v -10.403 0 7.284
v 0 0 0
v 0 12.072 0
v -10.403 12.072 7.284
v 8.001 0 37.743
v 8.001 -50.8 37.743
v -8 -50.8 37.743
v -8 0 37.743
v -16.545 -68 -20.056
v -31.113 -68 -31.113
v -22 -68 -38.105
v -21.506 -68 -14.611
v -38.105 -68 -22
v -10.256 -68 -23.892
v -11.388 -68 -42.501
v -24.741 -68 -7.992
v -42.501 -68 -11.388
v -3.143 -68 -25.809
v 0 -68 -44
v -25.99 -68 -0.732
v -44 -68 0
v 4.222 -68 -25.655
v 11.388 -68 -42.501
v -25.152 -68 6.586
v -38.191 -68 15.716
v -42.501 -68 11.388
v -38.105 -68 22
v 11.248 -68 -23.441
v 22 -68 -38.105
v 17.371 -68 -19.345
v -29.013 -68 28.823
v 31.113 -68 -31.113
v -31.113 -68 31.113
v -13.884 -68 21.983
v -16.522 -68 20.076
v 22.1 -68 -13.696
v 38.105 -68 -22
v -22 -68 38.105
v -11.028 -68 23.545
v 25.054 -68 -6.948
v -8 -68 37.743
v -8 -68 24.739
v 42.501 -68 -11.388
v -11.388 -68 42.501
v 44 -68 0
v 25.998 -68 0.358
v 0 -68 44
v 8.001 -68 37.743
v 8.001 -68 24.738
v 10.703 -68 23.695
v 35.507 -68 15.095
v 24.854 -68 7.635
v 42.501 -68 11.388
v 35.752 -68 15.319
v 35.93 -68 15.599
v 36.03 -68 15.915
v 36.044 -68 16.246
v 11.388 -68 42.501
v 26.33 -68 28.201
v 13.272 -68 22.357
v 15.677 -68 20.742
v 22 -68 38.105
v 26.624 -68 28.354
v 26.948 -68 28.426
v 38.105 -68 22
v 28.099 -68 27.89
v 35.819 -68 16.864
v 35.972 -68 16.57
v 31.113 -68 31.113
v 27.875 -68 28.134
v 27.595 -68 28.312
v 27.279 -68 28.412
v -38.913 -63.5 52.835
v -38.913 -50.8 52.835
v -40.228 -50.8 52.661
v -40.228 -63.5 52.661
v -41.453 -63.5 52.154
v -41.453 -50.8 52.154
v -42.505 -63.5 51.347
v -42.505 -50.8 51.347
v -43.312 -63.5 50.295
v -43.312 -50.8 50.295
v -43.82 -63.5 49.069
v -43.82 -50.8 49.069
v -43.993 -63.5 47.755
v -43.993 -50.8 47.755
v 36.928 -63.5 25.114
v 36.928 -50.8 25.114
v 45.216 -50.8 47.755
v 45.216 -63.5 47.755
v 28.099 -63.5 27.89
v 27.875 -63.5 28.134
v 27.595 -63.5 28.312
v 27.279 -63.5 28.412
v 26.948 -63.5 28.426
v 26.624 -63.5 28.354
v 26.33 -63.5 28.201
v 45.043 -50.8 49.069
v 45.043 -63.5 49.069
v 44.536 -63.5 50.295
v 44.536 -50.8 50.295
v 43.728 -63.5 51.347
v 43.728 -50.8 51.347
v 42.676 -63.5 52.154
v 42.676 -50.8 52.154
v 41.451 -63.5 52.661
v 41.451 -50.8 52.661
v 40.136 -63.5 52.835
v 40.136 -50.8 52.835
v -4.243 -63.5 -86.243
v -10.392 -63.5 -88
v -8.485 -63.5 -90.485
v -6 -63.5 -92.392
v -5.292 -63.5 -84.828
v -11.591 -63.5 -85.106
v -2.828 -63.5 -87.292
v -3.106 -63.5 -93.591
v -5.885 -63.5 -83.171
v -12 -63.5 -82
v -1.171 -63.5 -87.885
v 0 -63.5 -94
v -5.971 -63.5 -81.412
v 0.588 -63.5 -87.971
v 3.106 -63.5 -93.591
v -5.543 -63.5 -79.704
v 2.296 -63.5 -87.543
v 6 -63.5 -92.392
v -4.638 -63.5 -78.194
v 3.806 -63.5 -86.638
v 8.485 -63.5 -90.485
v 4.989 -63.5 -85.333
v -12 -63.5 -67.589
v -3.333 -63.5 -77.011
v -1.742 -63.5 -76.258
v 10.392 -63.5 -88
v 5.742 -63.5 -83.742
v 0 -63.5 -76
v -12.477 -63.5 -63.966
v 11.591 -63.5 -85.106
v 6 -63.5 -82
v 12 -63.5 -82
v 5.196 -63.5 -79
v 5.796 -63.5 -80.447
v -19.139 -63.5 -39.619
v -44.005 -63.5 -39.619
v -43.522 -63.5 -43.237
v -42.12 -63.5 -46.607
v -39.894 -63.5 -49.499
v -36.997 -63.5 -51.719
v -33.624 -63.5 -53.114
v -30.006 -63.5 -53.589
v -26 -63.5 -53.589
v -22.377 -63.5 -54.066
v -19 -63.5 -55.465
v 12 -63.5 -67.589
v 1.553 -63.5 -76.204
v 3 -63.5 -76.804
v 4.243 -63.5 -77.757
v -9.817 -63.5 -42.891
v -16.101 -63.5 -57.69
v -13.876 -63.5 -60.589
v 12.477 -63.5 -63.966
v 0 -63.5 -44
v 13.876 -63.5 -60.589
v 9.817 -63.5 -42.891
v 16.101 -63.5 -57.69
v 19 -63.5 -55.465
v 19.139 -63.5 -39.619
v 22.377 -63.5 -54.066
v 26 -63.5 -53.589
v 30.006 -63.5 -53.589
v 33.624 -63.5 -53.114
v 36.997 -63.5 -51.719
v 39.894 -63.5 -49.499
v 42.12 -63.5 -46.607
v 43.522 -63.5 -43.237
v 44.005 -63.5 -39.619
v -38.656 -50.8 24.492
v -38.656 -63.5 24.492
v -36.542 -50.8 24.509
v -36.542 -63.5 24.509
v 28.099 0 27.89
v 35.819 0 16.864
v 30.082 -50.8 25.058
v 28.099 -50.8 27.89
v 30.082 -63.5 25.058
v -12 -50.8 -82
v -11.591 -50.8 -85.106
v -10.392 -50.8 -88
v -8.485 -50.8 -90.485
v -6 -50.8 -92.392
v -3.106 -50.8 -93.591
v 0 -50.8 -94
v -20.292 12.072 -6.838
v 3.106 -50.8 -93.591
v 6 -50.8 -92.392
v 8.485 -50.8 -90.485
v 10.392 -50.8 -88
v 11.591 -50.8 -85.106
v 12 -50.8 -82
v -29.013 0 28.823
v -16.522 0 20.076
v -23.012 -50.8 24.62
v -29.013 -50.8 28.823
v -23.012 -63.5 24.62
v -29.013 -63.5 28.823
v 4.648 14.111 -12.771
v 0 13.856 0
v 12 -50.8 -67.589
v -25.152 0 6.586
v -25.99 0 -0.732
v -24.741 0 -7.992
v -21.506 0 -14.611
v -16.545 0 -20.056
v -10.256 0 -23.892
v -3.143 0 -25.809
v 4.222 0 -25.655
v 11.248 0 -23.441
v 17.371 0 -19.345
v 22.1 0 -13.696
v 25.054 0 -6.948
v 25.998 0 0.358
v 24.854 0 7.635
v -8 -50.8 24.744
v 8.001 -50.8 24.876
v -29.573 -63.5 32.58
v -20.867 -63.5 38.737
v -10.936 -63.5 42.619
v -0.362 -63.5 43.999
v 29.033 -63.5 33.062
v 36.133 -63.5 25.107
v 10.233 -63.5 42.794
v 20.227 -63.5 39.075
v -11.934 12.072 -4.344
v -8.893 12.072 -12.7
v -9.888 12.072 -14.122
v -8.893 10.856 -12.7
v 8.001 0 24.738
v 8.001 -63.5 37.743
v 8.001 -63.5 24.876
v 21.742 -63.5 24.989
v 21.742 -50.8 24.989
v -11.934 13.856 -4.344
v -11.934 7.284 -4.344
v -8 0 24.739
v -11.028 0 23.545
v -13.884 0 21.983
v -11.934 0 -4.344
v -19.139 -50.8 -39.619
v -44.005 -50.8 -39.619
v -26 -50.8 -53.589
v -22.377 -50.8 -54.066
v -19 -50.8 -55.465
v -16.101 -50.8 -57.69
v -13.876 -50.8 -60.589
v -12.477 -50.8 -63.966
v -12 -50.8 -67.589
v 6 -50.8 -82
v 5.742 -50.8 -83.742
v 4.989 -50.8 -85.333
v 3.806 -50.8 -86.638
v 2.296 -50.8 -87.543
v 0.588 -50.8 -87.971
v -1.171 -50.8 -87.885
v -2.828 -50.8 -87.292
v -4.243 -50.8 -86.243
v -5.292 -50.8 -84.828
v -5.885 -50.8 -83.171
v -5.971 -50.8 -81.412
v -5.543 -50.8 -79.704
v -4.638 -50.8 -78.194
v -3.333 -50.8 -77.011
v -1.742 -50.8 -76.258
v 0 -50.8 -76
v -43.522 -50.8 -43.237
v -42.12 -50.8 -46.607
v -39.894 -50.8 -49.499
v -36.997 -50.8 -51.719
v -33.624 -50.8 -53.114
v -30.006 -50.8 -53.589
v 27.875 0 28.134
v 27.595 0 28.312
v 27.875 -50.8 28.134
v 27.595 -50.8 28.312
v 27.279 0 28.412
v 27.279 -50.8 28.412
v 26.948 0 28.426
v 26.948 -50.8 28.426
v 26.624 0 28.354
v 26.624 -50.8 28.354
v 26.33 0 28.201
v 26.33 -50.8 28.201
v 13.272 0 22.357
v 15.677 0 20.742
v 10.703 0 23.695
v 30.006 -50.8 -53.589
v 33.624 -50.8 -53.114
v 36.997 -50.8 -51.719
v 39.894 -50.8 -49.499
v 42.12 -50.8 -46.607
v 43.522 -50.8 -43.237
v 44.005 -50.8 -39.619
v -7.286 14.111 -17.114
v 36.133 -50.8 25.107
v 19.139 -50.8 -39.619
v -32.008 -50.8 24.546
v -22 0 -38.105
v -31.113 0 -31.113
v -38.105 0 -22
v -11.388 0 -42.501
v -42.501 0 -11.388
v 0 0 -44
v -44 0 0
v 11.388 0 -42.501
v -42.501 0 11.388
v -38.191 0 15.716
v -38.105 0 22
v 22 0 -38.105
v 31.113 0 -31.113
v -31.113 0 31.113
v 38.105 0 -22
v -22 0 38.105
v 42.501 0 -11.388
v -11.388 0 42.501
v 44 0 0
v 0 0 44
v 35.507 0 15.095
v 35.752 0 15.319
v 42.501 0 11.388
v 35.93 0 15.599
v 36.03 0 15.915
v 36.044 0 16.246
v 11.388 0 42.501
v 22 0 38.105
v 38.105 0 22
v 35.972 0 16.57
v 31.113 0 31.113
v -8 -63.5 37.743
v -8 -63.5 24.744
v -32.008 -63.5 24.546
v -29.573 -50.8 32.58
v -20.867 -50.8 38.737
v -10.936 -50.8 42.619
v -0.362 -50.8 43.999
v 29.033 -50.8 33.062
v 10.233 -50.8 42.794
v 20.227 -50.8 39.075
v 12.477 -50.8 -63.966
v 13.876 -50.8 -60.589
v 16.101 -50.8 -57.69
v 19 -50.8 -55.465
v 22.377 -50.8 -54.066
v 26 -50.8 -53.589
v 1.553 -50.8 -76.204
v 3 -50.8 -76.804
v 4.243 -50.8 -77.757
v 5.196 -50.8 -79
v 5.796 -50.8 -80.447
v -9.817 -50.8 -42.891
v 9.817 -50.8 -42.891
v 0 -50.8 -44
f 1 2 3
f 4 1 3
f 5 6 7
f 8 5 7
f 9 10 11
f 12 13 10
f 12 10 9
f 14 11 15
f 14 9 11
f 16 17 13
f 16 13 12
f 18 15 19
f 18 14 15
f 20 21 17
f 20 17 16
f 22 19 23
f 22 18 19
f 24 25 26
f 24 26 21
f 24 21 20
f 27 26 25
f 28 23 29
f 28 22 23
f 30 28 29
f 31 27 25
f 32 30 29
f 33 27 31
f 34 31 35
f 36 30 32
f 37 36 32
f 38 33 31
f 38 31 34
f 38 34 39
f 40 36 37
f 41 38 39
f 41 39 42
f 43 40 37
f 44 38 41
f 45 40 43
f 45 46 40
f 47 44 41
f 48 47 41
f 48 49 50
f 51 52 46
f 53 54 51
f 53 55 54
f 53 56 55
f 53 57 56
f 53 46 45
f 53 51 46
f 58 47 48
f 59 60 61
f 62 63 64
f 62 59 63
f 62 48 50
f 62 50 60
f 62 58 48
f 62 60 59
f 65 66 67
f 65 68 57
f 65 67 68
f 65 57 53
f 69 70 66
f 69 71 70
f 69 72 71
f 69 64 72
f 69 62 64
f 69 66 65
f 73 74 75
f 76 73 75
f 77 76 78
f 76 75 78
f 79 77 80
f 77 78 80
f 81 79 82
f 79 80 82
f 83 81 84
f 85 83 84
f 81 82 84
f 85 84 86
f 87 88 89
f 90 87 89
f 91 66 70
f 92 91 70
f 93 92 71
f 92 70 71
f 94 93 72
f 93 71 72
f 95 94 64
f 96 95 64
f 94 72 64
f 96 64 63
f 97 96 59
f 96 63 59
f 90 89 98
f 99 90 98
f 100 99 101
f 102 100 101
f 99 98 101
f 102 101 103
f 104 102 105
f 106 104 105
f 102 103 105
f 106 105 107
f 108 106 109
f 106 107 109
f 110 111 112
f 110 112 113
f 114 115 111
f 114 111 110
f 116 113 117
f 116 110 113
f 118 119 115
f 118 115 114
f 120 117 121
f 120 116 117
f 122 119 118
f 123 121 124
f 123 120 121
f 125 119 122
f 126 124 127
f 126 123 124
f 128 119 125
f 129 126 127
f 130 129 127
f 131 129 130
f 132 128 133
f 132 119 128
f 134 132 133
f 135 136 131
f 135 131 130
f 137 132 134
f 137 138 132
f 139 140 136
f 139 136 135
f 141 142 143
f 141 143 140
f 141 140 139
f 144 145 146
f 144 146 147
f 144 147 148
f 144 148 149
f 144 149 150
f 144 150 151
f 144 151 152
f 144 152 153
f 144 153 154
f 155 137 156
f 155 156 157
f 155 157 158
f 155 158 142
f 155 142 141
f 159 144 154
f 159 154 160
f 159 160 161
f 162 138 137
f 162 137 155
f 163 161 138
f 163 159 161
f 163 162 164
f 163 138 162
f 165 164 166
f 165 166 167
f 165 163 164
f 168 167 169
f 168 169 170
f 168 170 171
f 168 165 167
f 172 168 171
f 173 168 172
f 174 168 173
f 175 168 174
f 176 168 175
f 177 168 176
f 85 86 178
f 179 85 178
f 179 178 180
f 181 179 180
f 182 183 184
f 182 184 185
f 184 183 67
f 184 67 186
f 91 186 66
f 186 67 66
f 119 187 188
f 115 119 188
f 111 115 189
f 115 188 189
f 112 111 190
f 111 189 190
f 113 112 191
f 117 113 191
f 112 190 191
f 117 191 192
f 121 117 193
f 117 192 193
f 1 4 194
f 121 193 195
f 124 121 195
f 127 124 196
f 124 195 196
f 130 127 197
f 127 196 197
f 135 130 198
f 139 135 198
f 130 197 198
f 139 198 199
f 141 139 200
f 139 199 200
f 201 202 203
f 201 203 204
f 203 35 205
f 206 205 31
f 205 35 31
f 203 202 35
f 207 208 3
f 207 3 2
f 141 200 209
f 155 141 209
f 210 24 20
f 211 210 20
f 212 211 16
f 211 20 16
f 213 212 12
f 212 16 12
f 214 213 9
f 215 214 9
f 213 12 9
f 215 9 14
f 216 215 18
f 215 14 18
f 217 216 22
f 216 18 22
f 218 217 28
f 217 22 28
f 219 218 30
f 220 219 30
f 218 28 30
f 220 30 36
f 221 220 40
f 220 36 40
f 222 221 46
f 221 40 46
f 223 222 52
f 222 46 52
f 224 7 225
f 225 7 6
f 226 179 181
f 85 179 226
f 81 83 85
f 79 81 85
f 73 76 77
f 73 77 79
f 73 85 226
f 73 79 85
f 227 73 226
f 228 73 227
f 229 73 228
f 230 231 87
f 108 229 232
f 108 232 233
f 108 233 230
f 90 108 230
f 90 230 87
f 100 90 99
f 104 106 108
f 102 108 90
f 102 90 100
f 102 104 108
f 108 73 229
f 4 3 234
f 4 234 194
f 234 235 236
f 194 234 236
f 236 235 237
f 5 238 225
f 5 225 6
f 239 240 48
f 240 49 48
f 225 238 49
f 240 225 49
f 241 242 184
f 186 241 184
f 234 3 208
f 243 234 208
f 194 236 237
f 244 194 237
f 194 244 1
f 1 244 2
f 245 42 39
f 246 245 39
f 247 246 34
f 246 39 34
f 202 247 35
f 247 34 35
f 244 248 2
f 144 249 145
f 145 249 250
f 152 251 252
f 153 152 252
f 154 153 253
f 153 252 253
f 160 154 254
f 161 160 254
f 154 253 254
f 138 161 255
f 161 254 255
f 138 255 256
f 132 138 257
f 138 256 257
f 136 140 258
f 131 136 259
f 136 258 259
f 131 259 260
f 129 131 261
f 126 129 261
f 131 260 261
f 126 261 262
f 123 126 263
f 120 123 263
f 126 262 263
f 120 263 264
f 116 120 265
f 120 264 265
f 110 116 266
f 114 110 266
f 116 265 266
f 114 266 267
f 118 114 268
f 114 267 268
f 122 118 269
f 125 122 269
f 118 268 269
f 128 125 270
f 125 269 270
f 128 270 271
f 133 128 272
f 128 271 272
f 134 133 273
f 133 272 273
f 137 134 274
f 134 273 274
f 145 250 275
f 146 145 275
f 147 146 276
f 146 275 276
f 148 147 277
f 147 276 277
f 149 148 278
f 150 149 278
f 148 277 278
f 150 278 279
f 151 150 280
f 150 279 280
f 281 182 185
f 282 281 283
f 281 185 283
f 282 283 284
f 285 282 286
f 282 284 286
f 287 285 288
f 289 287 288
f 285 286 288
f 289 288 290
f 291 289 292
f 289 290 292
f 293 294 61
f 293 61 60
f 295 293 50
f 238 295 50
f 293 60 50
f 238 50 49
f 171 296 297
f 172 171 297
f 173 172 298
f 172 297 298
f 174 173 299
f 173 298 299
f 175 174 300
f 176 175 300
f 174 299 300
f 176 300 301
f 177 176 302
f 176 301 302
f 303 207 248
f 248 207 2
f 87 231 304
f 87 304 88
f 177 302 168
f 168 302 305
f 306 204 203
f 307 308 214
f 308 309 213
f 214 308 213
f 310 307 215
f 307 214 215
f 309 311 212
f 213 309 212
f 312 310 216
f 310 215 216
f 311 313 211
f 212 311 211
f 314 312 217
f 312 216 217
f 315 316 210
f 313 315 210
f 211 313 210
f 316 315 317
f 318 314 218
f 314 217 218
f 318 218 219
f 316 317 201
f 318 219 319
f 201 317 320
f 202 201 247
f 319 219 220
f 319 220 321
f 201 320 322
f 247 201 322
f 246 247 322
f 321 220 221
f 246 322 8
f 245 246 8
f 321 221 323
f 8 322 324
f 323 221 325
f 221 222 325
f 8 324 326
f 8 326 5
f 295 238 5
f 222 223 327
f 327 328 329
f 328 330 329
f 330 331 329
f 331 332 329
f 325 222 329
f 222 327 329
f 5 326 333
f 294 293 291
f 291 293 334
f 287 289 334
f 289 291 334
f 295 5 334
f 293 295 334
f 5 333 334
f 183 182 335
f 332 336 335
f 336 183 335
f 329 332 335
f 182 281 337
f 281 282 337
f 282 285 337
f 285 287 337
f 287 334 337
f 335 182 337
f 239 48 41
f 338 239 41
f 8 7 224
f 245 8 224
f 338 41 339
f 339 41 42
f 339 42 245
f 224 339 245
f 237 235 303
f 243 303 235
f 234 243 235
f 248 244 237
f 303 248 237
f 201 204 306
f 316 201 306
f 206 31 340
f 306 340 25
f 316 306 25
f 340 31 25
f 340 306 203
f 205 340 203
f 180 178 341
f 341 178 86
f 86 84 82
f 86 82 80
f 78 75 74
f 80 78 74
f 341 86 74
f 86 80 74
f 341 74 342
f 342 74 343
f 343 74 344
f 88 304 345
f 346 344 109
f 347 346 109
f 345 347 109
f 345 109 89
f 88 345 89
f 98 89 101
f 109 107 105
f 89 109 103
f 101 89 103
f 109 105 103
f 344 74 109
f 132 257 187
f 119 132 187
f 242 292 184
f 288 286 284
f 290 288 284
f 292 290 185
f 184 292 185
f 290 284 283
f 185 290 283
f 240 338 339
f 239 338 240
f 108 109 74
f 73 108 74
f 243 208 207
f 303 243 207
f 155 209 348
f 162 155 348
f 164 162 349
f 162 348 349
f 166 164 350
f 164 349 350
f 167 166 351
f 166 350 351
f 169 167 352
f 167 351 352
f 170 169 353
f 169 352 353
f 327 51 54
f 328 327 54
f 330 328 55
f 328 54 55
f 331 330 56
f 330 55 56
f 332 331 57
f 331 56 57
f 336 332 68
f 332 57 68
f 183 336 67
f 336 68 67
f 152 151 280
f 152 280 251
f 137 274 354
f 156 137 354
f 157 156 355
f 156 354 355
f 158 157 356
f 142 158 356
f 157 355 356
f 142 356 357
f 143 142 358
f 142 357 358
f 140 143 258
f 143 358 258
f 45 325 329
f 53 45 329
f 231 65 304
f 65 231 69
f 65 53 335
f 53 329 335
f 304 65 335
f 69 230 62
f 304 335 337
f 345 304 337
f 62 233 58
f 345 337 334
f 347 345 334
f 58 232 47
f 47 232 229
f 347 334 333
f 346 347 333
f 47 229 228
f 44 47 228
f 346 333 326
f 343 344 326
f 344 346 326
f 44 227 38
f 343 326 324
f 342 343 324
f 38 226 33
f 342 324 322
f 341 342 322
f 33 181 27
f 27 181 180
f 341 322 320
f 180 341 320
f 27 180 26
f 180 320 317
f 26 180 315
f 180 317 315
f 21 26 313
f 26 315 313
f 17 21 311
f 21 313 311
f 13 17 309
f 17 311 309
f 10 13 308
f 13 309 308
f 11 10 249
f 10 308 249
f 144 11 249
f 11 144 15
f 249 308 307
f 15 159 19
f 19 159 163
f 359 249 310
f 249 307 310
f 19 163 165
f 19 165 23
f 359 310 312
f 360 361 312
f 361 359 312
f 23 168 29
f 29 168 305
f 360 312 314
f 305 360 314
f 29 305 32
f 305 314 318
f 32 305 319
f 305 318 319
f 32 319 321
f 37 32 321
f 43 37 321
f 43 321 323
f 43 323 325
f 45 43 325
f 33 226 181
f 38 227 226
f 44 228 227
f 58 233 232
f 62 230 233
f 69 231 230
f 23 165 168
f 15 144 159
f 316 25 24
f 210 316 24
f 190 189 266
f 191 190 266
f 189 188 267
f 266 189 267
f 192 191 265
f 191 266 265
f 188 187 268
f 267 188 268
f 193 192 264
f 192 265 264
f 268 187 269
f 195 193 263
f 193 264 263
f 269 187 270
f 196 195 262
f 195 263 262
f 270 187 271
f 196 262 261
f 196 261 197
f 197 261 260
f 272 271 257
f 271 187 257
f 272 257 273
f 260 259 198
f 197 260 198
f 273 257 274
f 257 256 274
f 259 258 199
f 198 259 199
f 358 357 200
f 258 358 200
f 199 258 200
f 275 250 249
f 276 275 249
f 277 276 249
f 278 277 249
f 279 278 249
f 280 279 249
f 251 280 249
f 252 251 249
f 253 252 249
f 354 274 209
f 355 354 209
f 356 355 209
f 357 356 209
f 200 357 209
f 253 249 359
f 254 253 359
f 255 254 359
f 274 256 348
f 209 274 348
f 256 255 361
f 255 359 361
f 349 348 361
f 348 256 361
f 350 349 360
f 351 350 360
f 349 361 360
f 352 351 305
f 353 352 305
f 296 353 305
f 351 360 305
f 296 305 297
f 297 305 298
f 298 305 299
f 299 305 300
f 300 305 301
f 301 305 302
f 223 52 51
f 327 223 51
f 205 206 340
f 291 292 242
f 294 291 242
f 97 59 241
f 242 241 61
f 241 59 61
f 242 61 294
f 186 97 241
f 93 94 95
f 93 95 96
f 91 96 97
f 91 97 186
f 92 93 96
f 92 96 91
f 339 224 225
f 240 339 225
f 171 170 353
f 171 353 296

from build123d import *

# Parameters (mm, degrees)
F0_R      = 44
F1_DEPTH  = 68
F7_DEPTH  = 68.001
F10_DEPTH = 12.7
F13_DEPTH = 12.7
F14_DEPTH = 12.7
F17_DEPTH = 12.7


# Not quite as in the source:
# - a feature names something its author has since deleted; it is built from what else it names


with BuildPart() as f1:
    # F0 (on Front) → F1 (new body)
    with BuildSketch(Plane.XZ):
        Circle(F0_R)
    extrude(amount=F1_DEPTH)

    # F3 (on offset) → F7 (cut, through all)
    with BuildSketch(Plane.XZ.offset(68)):
        with BuildLine():
            Line((26.3302369395, 28.2014110136), (15.6770635175, 20.7419786777))
            ThreePointArc((15.6770635175, 20.7419786777), (12.0064707427, 23.0617575285), (8.001, 24.7383103505))
            ThreePointArc((8.001, 24.7383103505), (0.0005254973, 25.9999999947), (-8, 24.7386337537))
            ThreePointArc((-8, 24.7386337537), (-12.480459792, 22.8087291049), (-16.5215362846, 20.0758272257))
            Line((-16.5215362846, 20.0758272257), (-29.0134122429, 28.8227329381))
            Line((-29.0134122429, 28.8227329381), (-38.1906352245, 15.7163002295))
            Line((-38.1906352245, 15.7163002295), (-25.15190359, 6.5864820503))
            ThreePointArc((-25.15190359, 6.5864820503), (0.5451088298, -25.9942850712), (24.8536719418, 7.6351156514))
            Line((24.8536719418, 7.6351156514), (35.5074599211, 15.094978305))
            ThreePointArc((35.5074599211, 15.094978305), (36.0297236932, 15.9147682156), (35.8193409432, 16.8637434754))
            Line((35.8193409432, 16.8637434754), (28.0990021099, 27.8895299915))
            ThreePointArc((28.0990021099, 27.8895299915), (27.2792121993, 28.4117937637), (26.3302369395, 28.2014110136))
        make_face()
        with BuildLine():
            ThreePointArc((-8, 24.7386337537), (0.0005254973, 25.9999999947), (8.001, 24.7383103505))
            Line((8.001, 24.7383103505), (8.001, 37.7434337537))
            Line((8.001, 37.7434337537), (0, 37.7434337537))
            Line((0, 37.7434337537), (-8, 37.7434337537))
            Line((-8, 37.7434337537), (-8, 24.7386337537))
        make_face()
    extrude(amount=-F7_DEPTH, mode=Mode.SUBTRACT)

    # F6 (on offset) → F14 (join)
    with BuildSketch(Plane.XZ.offset(50.8)):
        with BuildLine():
            Line((44.0054678571, -39.6192881453), (0, -39.6192881453))
            Line((0, -39.6192881453), (-44.0054678571, -39.6192881453))
            ThreePointArc((-44.0054678571, -39.6192881453), (-39.8943826467, -49.4993840076), (-30.0055, -53.5892881453))
            Line((-30.0055, -53.5892881453), (-26, -53.5892881453))
            ThreePointArc((-26, -53.5892881453), (-16.1005050634, -57.6897932087), (-12, -67.5892881453))
            Line((-12, -67.5892881453), (-12, -82))
            ThreePointArc((-12, -82), (-8.4852813742, -90.4852813742), (0, -94))
            ThreePointArc((0, -94), (8.4852813742, -90.4852813742), (12, -82))
            Line((12, -82), (12, -67.5892881453))
            ThreePointArc((12, -67.5892881453), (16.1005050634, -57.6897932087), (26, -53.5892881453))
            Line((26, -53.5892881453), (30.0055, -53.5892881453))
            ThreePointArc((30.0055, -53.5892881453), (39.8943826467, -49.4993840076), (44.0054678571, -39.6192881453))
        make_face()
        with BuildLine():
            ThreePointArc((6, -82), (-4.2426406871, -86.2426406871), (0, -76))
            ThreePointArc((0, -76), (4.2426406871, -77.7573593129), (6, -82))
        make_face(mode=Mode.SUBTRACT)
    extrude(amount=F14_DEPTH)

    # F16 (on offset) → F17 (join)
    with BuildSketch(Plane.XZ.offset(50.8)):
        with BuildLine():
            ThreePointArc((45.2163087713, 47.7545370714), (43.7284112197, 51.3466395198), (40.1363087713, 52.8345370714))
            Line((40.1363087713, 52.8345370714), (-38.9128, 52.8345370714))
            ThreePointArc((-38.9128, 52.8345370714), (-42.5049024484, 51.3466395198), (-43.9928, 47.7545370714))
            Line((-43.9928, 47.7545370714), (-38.6563204229, 24.4916565716))
            Line((-38.6563204229, 24.4916565716), (36.9281843305, 25.1138713211))
            Line((36.9281843305, 25.1138713211), (45.2163087713, 47.7545370714))
        make_face()
    extrude(amount=F17_DEPTH)


with BuildPart() as f10:
    # F9 (on face) → F10 (new body)
    with BuildSketch(Plane(origin=(0, 0, 0), x_dir=(0, -1, 0), z_dir=(-0.8191520443, 0, 0.5735764364))):
        Polygon((-12.0716131376, -17.2400502406), (0, 0), (-12.0716131376, 0), align=None)
    extrude(amount=F10_DEPTH)

    # F12 (on face) → F13 (join)
    with BuildSketch(Plane(origin=(0, 0, 0), x_dir=(0, -1, 0), z_dir=(-0.9396926208, 0, -0.3420201433))):
        Polygon((0, 0), (-13.8556587323, 0), (-14.1112022102, -13.5903209448), align=None)
    extrude(amount=F13_DEPTH)


solid = Compound([f1.part, f10.part])
